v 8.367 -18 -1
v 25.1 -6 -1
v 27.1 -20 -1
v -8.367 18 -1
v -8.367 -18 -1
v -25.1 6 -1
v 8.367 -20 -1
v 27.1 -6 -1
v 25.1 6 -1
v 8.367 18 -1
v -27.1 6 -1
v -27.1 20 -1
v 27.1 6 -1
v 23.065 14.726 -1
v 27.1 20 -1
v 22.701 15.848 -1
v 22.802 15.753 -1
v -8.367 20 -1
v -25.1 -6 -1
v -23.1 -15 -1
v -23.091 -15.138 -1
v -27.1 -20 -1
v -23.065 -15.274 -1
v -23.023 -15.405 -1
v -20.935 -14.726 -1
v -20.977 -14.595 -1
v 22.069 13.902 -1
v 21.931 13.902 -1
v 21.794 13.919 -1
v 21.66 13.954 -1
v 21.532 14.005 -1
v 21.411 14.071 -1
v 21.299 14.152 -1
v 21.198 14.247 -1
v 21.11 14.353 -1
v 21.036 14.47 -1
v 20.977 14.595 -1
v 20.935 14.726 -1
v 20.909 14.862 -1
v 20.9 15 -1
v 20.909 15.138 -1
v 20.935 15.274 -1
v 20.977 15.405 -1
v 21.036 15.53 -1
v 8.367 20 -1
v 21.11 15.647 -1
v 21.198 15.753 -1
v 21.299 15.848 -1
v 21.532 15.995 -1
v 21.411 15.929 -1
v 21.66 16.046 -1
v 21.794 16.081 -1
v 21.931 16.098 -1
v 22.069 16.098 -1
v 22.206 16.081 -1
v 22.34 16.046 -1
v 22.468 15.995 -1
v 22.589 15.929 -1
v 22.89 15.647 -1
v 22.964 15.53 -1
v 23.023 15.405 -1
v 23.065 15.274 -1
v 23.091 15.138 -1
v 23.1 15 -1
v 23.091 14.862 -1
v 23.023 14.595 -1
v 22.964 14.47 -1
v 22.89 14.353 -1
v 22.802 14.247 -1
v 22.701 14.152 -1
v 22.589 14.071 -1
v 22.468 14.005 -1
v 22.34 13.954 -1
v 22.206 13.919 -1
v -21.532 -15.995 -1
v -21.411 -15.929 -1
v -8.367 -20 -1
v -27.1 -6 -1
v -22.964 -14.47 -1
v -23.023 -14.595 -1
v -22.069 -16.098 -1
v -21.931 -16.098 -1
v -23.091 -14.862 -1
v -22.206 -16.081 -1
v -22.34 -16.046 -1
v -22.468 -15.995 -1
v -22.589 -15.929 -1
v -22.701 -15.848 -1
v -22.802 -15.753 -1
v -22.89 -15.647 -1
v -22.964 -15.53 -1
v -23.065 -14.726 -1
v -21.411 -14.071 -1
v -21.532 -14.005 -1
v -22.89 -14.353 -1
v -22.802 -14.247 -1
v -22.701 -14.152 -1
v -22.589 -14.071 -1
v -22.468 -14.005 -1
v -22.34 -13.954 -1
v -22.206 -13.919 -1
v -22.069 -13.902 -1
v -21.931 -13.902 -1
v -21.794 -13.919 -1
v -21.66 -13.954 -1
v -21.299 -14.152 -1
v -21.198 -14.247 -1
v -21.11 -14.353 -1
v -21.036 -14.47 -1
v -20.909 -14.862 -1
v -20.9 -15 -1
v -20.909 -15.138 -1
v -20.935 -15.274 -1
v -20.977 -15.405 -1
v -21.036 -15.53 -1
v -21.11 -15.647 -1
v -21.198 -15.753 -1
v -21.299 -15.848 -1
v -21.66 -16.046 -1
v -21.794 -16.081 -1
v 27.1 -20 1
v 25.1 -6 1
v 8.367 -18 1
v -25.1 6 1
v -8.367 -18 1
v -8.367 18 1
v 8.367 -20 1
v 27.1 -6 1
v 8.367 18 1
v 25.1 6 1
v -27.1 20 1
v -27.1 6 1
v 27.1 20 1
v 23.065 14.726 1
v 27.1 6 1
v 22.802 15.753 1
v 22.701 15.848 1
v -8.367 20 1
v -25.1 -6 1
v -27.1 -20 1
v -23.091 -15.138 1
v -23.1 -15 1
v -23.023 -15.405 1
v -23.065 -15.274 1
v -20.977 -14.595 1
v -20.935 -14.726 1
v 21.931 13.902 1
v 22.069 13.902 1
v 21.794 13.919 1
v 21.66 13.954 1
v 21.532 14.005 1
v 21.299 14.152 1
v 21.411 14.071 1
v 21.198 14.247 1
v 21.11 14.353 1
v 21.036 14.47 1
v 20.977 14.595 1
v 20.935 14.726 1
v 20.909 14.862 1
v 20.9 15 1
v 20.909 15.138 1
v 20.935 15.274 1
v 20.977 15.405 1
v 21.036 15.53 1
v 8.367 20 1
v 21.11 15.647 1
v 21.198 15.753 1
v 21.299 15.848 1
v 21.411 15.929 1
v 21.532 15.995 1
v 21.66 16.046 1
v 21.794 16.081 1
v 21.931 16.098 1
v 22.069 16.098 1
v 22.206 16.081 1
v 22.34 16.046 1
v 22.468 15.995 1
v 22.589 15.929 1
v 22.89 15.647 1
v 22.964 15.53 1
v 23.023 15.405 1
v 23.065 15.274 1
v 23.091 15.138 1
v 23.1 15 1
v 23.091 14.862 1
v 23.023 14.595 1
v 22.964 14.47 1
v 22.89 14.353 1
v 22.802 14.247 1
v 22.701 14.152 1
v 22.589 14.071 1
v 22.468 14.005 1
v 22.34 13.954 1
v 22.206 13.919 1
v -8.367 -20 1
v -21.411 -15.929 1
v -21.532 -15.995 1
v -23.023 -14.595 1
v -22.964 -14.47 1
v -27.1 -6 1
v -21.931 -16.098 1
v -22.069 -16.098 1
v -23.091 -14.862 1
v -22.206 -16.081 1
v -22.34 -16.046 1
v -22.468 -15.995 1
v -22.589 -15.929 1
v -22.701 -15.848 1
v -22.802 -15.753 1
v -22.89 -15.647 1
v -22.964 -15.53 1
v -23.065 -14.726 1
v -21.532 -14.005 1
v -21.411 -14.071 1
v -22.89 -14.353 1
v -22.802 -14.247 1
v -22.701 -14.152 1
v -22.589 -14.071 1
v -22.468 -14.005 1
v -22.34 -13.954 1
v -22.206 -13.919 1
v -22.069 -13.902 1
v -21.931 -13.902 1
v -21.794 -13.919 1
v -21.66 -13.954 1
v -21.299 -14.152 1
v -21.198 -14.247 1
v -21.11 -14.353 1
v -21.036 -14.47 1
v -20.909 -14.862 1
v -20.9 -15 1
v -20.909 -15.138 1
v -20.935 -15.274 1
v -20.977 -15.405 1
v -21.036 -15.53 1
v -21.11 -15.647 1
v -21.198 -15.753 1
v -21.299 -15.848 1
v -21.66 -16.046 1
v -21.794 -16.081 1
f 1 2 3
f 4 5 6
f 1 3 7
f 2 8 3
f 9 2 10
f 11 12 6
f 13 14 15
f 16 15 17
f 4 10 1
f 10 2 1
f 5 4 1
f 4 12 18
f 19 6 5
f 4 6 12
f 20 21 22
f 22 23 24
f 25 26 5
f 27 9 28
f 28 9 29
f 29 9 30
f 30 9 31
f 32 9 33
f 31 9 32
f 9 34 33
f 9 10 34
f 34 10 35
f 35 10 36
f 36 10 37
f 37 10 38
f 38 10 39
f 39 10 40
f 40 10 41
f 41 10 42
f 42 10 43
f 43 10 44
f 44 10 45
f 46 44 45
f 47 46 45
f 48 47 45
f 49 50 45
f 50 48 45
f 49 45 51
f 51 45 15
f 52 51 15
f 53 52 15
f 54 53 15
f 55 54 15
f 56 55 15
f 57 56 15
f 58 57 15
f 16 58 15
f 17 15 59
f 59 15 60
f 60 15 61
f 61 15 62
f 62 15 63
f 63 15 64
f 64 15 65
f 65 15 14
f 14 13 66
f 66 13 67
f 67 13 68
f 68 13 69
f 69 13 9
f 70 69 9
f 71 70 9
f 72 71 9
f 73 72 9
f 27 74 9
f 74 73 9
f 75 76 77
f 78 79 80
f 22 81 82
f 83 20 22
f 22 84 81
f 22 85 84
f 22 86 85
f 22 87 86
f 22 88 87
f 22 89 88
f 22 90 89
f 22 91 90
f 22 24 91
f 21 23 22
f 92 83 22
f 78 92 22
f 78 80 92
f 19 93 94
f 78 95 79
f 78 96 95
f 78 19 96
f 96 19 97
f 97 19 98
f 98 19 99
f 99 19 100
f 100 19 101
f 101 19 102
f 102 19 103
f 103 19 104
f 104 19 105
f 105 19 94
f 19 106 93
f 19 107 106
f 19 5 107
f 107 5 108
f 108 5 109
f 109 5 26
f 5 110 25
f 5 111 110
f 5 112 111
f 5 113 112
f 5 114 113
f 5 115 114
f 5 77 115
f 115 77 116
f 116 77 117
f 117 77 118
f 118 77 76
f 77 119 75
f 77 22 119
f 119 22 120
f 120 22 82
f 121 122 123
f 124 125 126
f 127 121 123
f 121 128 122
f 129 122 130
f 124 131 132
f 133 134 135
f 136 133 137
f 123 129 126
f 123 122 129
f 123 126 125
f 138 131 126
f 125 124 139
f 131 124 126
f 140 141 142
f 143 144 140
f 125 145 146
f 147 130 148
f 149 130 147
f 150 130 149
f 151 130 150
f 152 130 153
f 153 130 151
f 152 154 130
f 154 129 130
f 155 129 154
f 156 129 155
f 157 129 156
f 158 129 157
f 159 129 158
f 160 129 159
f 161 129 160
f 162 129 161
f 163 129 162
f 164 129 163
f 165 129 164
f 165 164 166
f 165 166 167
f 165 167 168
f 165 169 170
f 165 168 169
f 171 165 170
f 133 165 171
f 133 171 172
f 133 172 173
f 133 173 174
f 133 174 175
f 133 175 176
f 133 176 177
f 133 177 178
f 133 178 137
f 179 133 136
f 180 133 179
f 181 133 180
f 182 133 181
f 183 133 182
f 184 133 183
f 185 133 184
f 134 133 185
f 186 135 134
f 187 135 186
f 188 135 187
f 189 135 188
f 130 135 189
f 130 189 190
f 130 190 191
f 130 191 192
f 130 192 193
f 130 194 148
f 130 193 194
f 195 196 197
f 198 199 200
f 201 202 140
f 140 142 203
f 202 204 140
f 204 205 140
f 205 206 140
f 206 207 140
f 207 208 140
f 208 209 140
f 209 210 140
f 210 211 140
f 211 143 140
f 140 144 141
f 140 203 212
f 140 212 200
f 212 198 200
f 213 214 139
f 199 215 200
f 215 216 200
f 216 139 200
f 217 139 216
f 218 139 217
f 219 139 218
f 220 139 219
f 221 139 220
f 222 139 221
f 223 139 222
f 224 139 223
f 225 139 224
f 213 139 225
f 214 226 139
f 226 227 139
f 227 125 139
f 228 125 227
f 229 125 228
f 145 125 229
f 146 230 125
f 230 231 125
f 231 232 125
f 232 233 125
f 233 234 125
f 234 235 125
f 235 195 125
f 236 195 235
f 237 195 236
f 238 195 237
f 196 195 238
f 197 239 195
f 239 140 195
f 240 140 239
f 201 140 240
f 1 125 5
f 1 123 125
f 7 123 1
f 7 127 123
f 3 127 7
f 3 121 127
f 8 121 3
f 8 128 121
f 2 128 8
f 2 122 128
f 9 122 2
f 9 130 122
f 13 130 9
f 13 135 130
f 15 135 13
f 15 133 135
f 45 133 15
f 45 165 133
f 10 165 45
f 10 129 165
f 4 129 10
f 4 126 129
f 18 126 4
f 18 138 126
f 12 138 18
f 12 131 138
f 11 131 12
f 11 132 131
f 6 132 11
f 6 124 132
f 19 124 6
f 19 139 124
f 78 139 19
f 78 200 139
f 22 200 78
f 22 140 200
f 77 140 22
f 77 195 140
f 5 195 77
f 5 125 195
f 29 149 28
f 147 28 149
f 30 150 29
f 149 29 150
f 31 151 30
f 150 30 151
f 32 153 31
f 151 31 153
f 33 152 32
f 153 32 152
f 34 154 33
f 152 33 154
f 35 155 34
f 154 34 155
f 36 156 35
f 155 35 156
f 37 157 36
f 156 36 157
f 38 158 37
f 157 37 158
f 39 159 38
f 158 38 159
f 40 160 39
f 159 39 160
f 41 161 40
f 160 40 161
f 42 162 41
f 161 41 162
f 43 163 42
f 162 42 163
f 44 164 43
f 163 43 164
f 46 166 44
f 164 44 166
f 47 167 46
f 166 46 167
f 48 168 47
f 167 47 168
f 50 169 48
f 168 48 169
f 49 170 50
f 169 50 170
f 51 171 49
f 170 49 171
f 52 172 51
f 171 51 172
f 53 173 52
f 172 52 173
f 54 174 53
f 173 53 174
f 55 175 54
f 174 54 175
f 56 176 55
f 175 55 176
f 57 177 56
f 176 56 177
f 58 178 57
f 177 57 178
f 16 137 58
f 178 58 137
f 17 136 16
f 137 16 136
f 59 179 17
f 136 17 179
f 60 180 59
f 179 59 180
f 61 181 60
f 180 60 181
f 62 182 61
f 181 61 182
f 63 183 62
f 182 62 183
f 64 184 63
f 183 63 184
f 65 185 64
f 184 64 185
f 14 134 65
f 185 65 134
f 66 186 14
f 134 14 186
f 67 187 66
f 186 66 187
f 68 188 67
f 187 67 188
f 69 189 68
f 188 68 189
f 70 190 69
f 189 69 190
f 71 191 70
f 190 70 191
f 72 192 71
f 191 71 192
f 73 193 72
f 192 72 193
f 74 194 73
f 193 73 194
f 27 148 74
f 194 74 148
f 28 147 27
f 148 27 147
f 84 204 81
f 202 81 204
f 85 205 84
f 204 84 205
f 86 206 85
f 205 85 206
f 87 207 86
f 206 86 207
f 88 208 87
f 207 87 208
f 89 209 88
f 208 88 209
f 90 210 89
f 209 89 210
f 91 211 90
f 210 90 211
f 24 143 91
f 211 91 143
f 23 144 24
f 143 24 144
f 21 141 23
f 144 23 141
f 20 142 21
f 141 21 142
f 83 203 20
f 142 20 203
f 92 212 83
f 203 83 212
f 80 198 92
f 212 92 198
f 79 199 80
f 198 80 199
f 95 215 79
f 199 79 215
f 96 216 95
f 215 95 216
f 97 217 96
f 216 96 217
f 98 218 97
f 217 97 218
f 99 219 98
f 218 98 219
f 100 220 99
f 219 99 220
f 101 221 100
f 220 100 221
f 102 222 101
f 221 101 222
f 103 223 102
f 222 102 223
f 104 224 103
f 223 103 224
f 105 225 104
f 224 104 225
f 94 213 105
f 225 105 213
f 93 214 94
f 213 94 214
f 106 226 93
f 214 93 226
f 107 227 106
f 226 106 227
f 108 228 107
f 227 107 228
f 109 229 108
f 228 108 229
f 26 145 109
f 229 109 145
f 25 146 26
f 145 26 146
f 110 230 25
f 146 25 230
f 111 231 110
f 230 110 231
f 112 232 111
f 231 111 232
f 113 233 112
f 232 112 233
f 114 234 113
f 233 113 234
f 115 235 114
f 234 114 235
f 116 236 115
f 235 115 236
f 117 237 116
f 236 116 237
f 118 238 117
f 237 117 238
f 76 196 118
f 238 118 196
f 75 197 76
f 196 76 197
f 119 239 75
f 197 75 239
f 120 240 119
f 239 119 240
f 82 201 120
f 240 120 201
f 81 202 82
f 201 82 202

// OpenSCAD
// file: ../lib/side.scad
module side_top_bottom(inner_x,inner_y,width) {
  x = inner_x/2;
  y = inner_y/2;

  polygon(points=[
      [-x-width,-y-width],
      [-x*1/3,-y-width],
      [-x*1/3,-y],
      [x*1/3,-y],
      [x*1/3,-y-width],
      [x+width,-y-width],
      [x+width,-y*1/3],
      [x,-y*1/3],
      [x,y*1/3],
      [x+width,y*1/3],
      [x+width,y+width],
      [x*1/3,y+width],
      [x*1/3,y],
      [-x*1/3,y],
      [-x*1/3,y+width],
      [-x-width,y+width],
      [-x-width,y*1/3],
      [-x,y*1/3],
      [-x,-y*1/3],
      [-x-width,-y*1/3],
    ],convexity=10);
}

module side_left_right(inner_x,inner_z,width) {
  x = inner_x/2;
  z = inner_z/2;

  polygon(points=[
      [-x-width,-z],
      [-x*1/3,-z],
      [-x*1/3,-z-width],
      [x*1/3,-z-width],
      [x*1/3,-z],
      [x+width,-z],
      [x+width,-z*1/3],
      [x,-z*1/3],
      [x,z*1/3],
      [x+width,z*1/3],
      [x+width,z],
      [x*1/3,z],
      [x*1/3,z+width],
      [-x*1/3,z+width],
      [-x*1/3,z],
      [-x-width,z],
      [-x-width,z*1/3],
      [-x,z*1/3],
      [-x,-z*1/3],
      [-x-width,-z*1/3],
    ],convexity=10);
}


module side_front_back(inner_y,inner_z,width) {
  y = inner_y/2;
  z = inner_z/2;

  polygon(points=[
      [-y,-z],
      [-y*1/3,-z],
      [-y*1/3,-z-width],
      [y*1/3,-z-width],
      [y*1/3,-z],
      [y,-z],
      [y,-z*1/3],
      [y+width,-z*1/3],
      [y+width,z*1/3],
      [y,z*1/3],
      [y,z],
      [y*1/3,z],
      [y*1/3,z+width],
      [-y*1/3,z+width],
      [-y*1/3,z],
      [-y,z],
      [-y,z*1/3],
      [-y-width,z*1/3],
      [-y-width,-z*1/3],
      [-y,-z*1/3],
    ],convexity=10);
}
// file: bottom.2d.scad
use <../lib/side.scad>;

module bottom() {
  difference() {
    side_top_bottom(50.2,36,2);
    translate([-22,-15,0]) {
      circle(d=2.2, $fn=50);
    }
    translate([22,15,0]) {
      circle(d=2.2, $fn=50);
    }
  }
}

bottom();
// main file
use <bottom.2d.scad>;

linear_extrude(height = 2, center = true, convexity = 10, twist = 0) {
  bottom();
}
